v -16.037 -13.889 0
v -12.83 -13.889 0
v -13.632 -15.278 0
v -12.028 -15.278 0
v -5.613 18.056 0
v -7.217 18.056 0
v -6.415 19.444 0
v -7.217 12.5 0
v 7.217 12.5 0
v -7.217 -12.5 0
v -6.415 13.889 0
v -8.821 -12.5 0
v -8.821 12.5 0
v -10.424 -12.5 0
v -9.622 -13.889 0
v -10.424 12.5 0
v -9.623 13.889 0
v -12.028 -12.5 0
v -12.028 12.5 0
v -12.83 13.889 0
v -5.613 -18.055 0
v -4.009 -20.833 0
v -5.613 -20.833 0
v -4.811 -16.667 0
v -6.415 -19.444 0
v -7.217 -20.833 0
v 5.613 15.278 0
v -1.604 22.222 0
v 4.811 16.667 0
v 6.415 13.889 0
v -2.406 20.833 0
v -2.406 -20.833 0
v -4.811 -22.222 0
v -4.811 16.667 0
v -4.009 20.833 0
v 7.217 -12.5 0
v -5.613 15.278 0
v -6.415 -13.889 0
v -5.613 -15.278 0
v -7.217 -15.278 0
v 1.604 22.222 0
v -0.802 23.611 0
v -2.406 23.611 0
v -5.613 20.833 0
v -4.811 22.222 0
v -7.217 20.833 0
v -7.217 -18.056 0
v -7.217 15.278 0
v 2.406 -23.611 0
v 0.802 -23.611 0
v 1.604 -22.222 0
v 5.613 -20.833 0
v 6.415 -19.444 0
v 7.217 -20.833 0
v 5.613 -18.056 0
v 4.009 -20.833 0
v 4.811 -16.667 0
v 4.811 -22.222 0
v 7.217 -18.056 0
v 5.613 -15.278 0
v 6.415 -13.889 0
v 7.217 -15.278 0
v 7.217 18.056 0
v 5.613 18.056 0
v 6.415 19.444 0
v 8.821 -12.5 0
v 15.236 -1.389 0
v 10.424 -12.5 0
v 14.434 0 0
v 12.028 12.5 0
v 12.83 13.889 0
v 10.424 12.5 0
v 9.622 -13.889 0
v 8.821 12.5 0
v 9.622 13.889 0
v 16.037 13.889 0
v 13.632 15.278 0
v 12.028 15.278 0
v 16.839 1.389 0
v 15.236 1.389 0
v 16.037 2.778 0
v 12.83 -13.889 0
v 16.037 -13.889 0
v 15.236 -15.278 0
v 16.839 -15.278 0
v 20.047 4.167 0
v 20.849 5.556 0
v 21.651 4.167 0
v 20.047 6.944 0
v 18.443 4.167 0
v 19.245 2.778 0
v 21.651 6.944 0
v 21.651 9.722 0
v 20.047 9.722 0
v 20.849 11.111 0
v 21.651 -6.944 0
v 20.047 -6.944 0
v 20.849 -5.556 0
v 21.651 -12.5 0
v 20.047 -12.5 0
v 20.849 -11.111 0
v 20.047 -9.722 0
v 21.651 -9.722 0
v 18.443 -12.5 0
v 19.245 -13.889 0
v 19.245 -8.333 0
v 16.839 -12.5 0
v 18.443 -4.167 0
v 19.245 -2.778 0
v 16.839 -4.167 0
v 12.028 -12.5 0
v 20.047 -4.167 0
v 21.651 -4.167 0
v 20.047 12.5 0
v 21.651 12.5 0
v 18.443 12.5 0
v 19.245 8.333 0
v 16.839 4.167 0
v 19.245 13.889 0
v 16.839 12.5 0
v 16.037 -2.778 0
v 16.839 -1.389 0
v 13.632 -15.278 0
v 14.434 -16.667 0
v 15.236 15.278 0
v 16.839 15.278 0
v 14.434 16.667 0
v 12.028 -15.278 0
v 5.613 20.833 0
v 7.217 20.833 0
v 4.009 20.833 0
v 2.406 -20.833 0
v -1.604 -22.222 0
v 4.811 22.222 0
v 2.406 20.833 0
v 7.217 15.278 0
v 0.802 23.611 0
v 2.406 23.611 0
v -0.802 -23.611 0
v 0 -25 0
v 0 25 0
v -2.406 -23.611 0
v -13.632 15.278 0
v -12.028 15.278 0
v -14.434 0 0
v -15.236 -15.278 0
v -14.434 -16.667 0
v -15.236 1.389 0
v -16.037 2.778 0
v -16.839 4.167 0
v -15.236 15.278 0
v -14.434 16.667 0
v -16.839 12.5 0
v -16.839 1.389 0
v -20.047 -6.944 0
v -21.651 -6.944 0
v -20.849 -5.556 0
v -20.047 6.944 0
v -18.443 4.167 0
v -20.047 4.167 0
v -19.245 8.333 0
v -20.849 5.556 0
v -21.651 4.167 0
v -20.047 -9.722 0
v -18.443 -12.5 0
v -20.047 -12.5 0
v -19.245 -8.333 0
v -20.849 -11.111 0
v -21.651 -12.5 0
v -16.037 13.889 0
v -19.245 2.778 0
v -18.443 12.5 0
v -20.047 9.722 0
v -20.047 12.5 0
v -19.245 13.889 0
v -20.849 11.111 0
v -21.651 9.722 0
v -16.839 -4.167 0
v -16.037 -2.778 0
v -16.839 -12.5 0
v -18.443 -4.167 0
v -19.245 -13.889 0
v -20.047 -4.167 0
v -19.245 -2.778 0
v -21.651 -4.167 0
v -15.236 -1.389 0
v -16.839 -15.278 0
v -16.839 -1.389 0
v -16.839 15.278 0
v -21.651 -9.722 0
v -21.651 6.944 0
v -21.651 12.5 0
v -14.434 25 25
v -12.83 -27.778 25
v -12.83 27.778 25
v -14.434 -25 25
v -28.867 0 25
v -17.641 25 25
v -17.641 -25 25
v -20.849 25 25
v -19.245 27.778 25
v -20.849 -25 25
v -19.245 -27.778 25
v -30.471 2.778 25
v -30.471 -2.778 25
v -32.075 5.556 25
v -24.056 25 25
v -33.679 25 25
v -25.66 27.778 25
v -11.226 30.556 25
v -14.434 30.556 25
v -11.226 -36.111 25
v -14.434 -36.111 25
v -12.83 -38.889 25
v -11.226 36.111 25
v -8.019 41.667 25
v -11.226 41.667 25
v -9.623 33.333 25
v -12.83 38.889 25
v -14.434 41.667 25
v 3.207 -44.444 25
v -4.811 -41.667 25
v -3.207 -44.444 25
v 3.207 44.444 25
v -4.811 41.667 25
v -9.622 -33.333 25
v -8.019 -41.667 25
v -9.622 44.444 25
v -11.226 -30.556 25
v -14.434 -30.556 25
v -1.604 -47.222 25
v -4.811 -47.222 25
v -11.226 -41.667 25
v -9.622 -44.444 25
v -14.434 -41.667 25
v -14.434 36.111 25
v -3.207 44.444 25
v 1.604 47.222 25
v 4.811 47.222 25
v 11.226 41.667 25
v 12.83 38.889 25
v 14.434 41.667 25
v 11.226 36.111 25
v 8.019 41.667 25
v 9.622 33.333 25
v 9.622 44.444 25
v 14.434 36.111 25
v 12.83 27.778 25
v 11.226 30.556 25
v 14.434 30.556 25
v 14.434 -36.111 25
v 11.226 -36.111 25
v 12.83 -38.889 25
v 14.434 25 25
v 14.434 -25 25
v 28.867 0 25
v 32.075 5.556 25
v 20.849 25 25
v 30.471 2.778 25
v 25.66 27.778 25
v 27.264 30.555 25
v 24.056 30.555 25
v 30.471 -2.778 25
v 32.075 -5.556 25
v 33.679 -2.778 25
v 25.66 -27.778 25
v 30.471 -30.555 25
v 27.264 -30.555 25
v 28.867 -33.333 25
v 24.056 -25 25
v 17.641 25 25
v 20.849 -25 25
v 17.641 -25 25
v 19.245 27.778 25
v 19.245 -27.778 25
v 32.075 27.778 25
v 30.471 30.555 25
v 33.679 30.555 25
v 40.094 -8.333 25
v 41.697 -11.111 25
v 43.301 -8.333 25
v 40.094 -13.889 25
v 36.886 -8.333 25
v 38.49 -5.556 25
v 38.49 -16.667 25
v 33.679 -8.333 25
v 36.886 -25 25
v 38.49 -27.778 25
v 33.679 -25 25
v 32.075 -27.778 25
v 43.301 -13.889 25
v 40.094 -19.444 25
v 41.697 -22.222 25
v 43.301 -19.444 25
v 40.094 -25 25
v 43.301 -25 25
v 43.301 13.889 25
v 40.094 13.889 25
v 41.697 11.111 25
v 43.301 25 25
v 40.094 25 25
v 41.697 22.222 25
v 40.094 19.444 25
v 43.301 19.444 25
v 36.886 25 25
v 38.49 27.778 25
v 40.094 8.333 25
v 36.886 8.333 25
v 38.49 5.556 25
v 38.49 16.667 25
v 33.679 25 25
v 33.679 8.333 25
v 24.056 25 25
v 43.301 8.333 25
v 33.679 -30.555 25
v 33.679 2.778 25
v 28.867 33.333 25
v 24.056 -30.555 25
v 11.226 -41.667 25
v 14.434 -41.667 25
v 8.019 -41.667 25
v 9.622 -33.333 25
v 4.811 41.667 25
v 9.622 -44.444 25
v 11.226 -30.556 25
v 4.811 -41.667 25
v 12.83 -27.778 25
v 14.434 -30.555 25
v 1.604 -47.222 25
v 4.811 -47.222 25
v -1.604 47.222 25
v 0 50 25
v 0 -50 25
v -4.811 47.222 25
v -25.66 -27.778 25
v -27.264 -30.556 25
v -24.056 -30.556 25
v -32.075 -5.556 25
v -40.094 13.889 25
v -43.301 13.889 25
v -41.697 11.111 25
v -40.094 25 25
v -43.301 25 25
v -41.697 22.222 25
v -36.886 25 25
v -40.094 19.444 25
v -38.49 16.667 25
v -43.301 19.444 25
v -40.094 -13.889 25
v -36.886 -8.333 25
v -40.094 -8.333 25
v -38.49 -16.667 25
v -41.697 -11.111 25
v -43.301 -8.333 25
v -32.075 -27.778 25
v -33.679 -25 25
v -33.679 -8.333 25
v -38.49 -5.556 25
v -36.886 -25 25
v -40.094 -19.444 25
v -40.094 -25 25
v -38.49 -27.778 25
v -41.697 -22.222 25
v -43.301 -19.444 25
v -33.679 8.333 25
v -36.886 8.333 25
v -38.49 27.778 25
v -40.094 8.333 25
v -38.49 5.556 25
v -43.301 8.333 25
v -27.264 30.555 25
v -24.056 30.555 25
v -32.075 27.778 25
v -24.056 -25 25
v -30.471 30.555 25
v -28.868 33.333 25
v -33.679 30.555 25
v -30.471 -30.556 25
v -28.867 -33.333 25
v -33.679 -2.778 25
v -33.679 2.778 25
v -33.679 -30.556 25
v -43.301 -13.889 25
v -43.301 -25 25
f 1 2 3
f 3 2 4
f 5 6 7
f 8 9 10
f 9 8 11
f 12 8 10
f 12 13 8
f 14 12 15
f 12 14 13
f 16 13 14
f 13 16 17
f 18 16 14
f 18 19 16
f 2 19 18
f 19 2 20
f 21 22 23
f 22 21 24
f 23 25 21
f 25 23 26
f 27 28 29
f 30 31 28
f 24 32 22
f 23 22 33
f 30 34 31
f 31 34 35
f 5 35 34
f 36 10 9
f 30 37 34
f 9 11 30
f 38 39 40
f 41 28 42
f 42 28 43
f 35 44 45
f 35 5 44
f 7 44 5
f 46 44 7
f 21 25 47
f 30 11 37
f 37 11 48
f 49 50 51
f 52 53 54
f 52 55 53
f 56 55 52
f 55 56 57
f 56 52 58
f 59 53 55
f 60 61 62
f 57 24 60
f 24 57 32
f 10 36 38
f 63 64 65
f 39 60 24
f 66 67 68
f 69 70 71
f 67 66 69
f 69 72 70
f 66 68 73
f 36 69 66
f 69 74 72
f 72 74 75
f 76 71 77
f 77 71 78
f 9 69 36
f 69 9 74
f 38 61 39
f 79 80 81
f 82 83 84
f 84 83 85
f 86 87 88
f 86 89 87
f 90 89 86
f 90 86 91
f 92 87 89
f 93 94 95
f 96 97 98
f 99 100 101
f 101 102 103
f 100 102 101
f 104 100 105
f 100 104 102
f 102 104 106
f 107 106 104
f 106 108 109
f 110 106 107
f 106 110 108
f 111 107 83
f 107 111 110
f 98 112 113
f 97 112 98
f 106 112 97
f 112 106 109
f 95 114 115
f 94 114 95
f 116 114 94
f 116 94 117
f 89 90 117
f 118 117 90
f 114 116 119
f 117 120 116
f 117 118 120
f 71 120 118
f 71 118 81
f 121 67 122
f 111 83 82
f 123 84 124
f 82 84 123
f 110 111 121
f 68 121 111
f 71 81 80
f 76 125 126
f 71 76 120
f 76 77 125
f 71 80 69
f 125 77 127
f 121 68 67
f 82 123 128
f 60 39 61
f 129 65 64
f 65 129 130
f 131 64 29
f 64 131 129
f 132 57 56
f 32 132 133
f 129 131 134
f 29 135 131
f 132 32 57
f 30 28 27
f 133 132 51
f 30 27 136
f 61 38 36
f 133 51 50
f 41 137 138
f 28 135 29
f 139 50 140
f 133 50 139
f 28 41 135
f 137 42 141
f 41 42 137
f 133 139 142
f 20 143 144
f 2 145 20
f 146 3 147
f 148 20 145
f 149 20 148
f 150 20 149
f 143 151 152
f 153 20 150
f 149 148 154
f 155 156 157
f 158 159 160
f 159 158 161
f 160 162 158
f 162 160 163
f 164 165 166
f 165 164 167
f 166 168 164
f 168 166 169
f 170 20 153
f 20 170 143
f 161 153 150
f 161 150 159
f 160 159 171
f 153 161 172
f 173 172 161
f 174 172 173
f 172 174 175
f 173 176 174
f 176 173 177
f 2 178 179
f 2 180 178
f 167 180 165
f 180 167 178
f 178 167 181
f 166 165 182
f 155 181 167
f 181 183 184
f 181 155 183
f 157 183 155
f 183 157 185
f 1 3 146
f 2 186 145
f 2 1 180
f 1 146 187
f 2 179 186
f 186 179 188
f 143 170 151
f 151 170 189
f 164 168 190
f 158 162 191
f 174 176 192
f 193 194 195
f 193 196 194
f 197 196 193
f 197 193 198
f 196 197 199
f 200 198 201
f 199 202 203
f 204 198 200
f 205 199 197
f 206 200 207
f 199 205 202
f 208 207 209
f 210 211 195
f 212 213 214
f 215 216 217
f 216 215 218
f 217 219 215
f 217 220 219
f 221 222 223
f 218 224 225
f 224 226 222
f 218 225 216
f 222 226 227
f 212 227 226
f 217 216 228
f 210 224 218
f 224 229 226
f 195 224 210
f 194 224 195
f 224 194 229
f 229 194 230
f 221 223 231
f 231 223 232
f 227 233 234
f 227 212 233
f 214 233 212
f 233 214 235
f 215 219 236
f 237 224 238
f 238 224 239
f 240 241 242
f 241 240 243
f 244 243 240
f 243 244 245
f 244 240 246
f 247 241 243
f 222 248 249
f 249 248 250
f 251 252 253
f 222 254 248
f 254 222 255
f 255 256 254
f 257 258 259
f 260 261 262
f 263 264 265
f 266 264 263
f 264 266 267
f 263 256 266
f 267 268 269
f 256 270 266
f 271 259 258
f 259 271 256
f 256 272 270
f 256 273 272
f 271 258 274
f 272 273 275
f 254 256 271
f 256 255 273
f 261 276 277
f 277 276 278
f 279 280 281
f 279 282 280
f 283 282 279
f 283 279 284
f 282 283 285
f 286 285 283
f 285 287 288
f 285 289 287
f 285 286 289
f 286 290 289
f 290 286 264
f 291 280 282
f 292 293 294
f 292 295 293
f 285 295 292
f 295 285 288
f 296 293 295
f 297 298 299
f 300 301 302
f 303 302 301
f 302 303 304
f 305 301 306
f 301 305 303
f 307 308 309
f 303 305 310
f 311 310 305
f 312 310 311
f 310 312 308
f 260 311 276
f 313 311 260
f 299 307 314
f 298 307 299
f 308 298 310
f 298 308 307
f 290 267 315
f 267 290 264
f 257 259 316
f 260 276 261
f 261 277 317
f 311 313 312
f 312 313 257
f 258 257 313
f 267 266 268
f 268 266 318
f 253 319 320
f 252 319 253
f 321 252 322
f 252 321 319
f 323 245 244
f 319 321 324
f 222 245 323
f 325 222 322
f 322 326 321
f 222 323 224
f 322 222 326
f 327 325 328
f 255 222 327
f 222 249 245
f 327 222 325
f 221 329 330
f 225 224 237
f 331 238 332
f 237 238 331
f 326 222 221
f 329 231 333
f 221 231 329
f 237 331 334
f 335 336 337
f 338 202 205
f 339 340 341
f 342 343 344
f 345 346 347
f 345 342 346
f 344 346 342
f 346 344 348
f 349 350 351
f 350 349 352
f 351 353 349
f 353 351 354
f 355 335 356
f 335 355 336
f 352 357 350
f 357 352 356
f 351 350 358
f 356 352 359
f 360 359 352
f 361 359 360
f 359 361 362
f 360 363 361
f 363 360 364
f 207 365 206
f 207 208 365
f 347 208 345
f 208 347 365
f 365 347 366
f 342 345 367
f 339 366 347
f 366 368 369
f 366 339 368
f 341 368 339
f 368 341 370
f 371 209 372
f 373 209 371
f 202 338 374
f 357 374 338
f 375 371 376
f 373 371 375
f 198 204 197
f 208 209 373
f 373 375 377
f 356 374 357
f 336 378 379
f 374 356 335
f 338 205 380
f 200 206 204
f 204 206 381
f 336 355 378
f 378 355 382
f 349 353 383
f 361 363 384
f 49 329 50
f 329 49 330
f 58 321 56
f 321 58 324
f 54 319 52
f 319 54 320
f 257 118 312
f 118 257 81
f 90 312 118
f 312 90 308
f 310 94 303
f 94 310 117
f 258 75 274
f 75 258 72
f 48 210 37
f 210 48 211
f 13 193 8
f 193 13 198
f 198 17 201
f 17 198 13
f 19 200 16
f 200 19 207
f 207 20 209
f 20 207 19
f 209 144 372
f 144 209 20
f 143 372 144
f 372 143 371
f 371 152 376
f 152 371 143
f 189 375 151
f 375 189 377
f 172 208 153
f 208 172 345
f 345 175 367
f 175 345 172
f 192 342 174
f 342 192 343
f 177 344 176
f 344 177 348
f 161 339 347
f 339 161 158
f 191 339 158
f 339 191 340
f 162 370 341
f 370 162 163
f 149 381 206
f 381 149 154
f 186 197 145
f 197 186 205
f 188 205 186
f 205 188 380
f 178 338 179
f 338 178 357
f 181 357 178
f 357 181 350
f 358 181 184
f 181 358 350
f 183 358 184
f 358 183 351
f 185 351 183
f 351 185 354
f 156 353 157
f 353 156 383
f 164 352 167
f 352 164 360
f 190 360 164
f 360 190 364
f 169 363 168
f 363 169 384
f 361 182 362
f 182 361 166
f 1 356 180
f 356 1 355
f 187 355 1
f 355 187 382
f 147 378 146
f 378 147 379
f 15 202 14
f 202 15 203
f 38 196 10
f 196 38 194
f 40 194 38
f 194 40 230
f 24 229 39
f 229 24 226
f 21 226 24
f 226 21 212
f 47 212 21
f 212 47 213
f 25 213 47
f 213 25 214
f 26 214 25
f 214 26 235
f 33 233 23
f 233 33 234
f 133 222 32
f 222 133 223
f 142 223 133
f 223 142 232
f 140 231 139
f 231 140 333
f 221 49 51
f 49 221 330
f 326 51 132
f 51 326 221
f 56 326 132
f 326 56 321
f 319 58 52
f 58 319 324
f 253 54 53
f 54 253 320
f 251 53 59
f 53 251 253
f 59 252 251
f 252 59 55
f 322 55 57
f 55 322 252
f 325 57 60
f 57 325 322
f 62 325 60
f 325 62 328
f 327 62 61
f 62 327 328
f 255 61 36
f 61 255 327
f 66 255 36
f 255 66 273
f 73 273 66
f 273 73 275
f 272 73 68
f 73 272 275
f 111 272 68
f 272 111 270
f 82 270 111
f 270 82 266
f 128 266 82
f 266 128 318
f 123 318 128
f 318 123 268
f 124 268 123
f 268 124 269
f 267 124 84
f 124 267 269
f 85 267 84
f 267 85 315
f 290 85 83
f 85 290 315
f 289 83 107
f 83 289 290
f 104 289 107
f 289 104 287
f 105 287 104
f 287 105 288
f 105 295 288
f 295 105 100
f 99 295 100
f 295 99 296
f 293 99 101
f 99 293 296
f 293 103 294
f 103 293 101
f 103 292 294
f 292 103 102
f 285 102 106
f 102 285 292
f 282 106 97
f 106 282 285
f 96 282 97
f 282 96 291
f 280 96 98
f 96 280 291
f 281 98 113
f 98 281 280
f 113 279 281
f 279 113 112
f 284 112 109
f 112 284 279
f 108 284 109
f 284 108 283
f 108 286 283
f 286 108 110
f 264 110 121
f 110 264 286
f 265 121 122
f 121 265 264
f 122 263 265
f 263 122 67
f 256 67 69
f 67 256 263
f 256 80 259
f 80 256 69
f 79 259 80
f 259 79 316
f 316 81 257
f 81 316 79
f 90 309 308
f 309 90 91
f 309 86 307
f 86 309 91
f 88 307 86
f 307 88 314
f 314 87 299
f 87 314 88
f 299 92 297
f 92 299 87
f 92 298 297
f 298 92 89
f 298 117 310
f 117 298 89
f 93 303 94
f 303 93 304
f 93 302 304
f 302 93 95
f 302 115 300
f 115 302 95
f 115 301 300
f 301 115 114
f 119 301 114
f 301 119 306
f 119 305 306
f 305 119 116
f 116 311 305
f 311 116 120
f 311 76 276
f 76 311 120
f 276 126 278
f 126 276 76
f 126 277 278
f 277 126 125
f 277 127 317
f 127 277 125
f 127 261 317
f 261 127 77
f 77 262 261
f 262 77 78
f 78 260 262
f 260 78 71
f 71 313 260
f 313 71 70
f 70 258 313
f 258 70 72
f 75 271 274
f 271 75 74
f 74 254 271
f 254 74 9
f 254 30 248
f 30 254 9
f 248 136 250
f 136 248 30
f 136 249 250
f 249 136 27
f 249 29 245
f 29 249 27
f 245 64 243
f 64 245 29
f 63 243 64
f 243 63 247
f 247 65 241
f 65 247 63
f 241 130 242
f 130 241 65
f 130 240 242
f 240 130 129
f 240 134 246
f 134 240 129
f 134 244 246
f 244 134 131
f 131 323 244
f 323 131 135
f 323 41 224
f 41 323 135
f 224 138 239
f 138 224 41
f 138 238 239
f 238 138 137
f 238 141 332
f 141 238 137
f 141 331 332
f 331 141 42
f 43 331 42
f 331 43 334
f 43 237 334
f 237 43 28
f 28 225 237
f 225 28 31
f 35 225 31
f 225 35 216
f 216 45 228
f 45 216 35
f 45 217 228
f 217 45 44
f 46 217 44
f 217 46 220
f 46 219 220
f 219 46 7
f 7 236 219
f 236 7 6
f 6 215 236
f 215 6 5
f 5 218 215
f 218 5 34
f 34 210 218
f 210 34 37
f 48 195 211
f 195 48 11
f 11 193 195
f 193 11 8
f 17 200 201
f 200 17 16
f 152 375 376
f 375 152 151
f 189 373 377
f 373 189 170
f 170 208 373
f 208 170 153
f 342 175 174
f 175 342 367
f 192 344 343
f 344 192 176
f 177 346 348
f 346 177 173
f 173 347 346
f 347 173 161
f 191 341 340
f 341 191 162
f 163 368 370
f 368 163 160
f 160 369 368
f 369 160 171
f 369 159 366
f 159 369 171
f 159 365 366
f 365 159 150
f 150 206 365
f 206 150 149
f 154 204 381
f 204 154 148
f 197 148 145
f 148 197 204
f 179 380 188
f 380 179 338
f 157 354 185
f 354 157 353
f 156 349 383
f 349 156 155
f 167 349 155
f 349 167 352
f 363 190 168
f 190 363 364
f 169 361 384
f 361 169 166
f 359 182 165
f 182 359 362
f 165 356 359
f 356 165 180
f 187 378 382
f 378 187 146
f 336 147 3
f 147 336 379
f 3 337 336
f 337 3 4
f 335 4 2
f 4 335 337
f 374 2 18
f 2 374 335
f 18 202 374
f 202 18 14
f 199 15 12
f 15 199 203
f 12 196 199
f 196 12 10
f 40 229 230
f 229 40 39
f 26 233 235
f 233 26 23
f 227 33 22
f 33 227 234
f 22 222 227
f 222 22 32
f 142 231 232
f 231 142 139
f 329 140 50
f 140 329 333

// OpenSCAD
union() {
	translate(v = [0, 0, 25]) {
		linear_extrude(height = 125, scale = 0, slices = 100, twist = 180) {
			union() {
				rotate(a = 60) {
					union() {
						rotate(a = 60) {
							union() {
								rotate(a = 60) {
									union() {
										rotate(a = 60) {
											union() {
												rotate(a = 60) {
													union() {
														rotate(a = 60) {
															union() {
																rotate(a = 60) {
																	union() {
																		rotate(a = 60) {
																			union() {
																				rotate(a = 60) {
																					union() {
																						rotate(a = 60) {
																							union() {
																								rotate(a = 60) {
																									union() {
																										rotate(a = 60) {
																											union() {
																												polygon(points = [[0, 50.0], [-43.30127018922193, -25.0], [43.30127018922193, -25.0]]);
																												rotate(a = 60) {
																													polygon(points = [[0, 50.0], [-43.30127018922193, -25.0], [43.30127018922193, -25.0]]);
																												}
																											}
																										}
																										translate(v = [0, 33.333333333333336, 0]) {
																											scale(v = 0.3333333333333333) {
																												union() {
																													polygon(points = [[0, 50.0], [-43.30127018922193, -25.0], [43.30127018922193, -25.0]]);
																													rotate(a = 60) {
																														polygon(points = [[0, 50.0], [-43.30127018922193, -25.0], [43.30127018922193, -25.0]]);
																													}
																												}
																											}
																										}
																									}
																								}
																								translate(v = [0, 33.333333333333336, 0]) {
																									scale(v = 0.3333333333333333) {
																										union() {
																											polygon(points = [[0, 50.0], [-43.30127018922193, -25.0], [43.30127018922193, -25.0]]);
																											rotate(a = 60) {
																												polygon(points = [[0, 50.0], [-43.30127018922193, -25.0], [43.30127018922193, -25.0]]);
																											}
																										}
																									}
																								}
																							}
																						}
																						translate(v = [0, 33.333333333333336, 0]) {
																							scale(v = 0.3333333333333333) {
																								union() {
																									polygon(points = [[0, 50.0], [-43.30127018922193, -25.0], [43.30127018922193, -25.0]]);
																									rotate(a = 60) {
																										polygon(points = [[0, 50.0], [-43.30127018922193, -25.0], [43.30127018922193, -25.0]]);
																									}
																								}
																							}
																						}
																					}
																				}
																				translate(v = [0, 33.333333333333336, 0]) {
																					scale(v = 0.3333333333333333) {
																						union() {
																							polygon(points = [[0, 50.0], [-43.30127018922193, -25.0], [43.30127018922193, -25.0]]);
																							rotate(a = 60) {
																								polygon(points = [[0, 50.0], [-43.30127018922193, -25.0], [43.30127018922193, -25.0]]);
																							}
																						}
																					}
																				}
																			}
																		}
																		translate(v = [0, 33.333333333333336, 0]) {
																			scale(v = 0.3333333333333333) {
																				union() {
																					polygon(points = [[0, 50.0], [-43.30127018922193, -25.0], [43.30127018922193, -25.0]]);
																					rotate(a = 60) {
																						polygon(points = [[0, 50.0], [-43.30127018922193, -25.0], [43.30127018922193, -25.0]]);
																					}
																				}
																			}
																		}
																	}
																}
																translate(v = [0, 33.333333333333336, 0]) {
																	scale(v = 0.3333333333333333) {
																		union() {
																			polygon(points = [[0, 50.0], [-43.30127018922193, -25.0], [43.30127018922193, -25.0]]);
																			rotate(a = 60) {
																				polygon(points = [[0, 50.0], [-43.30127018922193, -25.0], [43.30127018922193, -25.0]]);
																			}
																		}
																	}
																}
															}
														}
														translate(v = [0, 33.333333333333336, 0]) {
															scale(v = 0.3333333333333333) {
																union() {
																	rotate(a = 60) {
																		union() {
																			rotate(a = 60) {
																				union() {
																					rotate(a = 60) {
																						union() {
																							rotate(a = 60) {
																								union() {
																									rotate(a = 60) {
																										union() {
																											rotate(a = 60) {
																												union() {
																													polygon(points = [[0, 50.0], [-43.30127018922193, -25.0], [43.30127018922193, -25.0]]);
																													rotate(a = 60) {
																														polygon(points = [[0, 50.0], [-43.30127018922193, -25.0], [43.30127018922193, -25.0]]);
																													}
																												}
																											}
																											translate(v = [0, 33.333333333333336, 0]) {
																												scale(v = 0.3333333333333333) {
																													union() {
																														polygon(points = [[0, 50.0], [-43.30127018922193, -25.0], [43.30127018922193, -25.0]]);
																														rotate(a = 60) {
																															polygon(points = [[0, 50.0], [-43.30127018922193, -25.0], [43.30127018922193, -25.0]]);
																														}
																													}
																												}
																											}
																										}
																									}
																									translate(v = [0, 33.333333333333336, 0]) {
																										scale(v = 0.3333333333333333) {
																											union() {
																												polygon(points = [[0, 50.0], [-43.30127018922193, -25.0], [43.30127018922193, -25.0]]);
																												rotate(a = 60) {
																													polygon(points = [[0, 50.0], [-43.30127018922193, -25.0], [43.30127018922193, -25.0]]);
																												}
																											}
																										}
																									}
																								}
																							}
																							translate(v = [0, 33.333333333333336, 0]) {
																								scale(v = 0.3333333333333333) {
																									union() {
																										polygon(points = [[0, 50.0], [-43.30127018922193, -25.0], [43.30127018922193, -25.0]]);
																										rotate(a = 60) {
																											polygon(points = [[0, 50.0], [-43.30127018922193, -25.0], [43.30127018922193, -25.0]]);
																										}
																									}
																								}
																							}
																						}
																					}
																					translate(v = [0, 33.333333333333336, 0]) {
																						scale(v = 0.3333333333333333) {
																							union() {
																								polygon(points = [[0, 50.0], [-43.30127018922193, -25.0], [43.30127018922193, -25.0]]);
																								rotate(a = 60) {
																									polygon(points = [[0, 50.0], [-43.30127018922193, -25.0], [43.30127018922193, -25.0]]);
																								}
																							}
																						}
																					}
																				}
																			}
																			translate(v = [0, 33.333333333333336, 0]) {
																				scale(v = 0.3333333333333333) {
																					union() {
																						polygon(points = [[0, 50.0], [-43.30127018922193, -25.0], [43.30127018922193, -25.0]]);
																						rotate(a = 60) {
																							polygon(points = [[0, 50.0], [-43.30127018922193, -25.0], [43.30127018922193, -25.0]]);
																						}
																					}
																				}
																			}
																		}
																	}
																	translate(v = [0, 33.333333333333336, 0]) {
																		scale(v = 0.3333333333333333) {
																			union() {
																				polygon(points = [[0, 50.0], [-43.30127018922193, -25.0], [43.30127018922193, -25.0]]);
																				rotate(a = 60) {
																					polygon(points = [[0, 50.0], [-43.30127018922193, -25.0], [43.30127018922193, -25.0]]);
																				}
																			}
																		}
																	}
																}
															}
														}
													}
												}
												translate(v = [0, 33.333333333333336, 0]) {
													scale(v = 0.3333333333333333) {
														union() {
															rotate(a = 60) {
																union() {
																	rotate(a = 60) {
																		union() {
																			rotate(a = 60) {
																				union() {
																					rotate(a = 60) {
																						union() {
																							rotate(a = 60) {
																								union() {
																									rotate(a = 60) {
																										union() {
																											polygon(points = [[0, 50.0], [-43.30127018922193, -25.0], [43.30127018922193, -25.0]]);
																											rotate(a = 60) {
																												polygon(points = [[0, 50.0], [-43.30127018922193, -25.0], [43.30127018922193, -25.0]]);
																											}
																										}
																									}
																									translate(v = [0, 33.333333333333336, 0]) {
																										scale(v = 0.3333333333333333) {
																											union() {
																												polygon(points = [[0, 50.0], [-43.30127018922193, -25.0], [43.30127018922193, -25.0]]);
																												rotate(a = 60) {
																													polygon(points = [[0, 50.0], [-43.30127018922193, -25.0], [43.30127018922193, -25.0]]);
																												}
																											}
																										}
																									}
																								}
																							}
																							translate(v = [0, 33.333333333333336, 0]) {
																								scale(v = 0.3333333333333333) {
																									union() {
																										polygon(points = [[0, 50.0], [-43.30127018922193, -25.0], [43.30127018922193, -25.0]]);
																										rotate(a = 60) {
																											polygon(points = [[0, 50.0], [-43.30127018922193, -25.0], [43.30127018922193, -25.0]]);
																										}
																									}
																								}
																							}
																						}
																					}
																					translate(v = [0, 33.333333333333336, 0]) {
																						scale(v = 0.3333333333333333) {
																							union() {
																								polygon(points = [[0, 50.0], [-43.30127018922193, -25.0], [43.30127018922193, -25.0]]);
																								rotate(a = 60) {
																									polygon(points = [[0, 50.0], [-43.30127018922193, -25.0], [43.30127018922193, -25.0]]);
																								}
																							}
																						}
																					}
																				}
																			}
																			translate(v = [0, 33.333333333333336, 0]) {
																				scale(v = 0.3333333333333333) {
																					union() {
																						polygon(points = [[0, 50.0], [-43.30127018922193, -25.0], [43.30127018922193, -25.0]]);
																						rotate(a = 60) {
																							polygon(points = [[0, 50.0], [-43.30127018922193, -25.0], [43.30127018922193, -25.0]]);
																						}
																					}
																				}
																			}
																		}
																	}
																	translate(v = [0, 33.333333333333336, 0]) {
																		scale(v = 0.3333333333333333) {
																			union() {
																				polygon(points = [[0, 50.0], [-43.30127018922193, -25.0], [43.30127018922193, -25.0]]);
																				rotate(a = 60) {
																					polygon(points = [[0, 50.0], [-43.30127018922193, -25.0], [43.30127018922193, -25.0]]);
																				}
																			}
																		}
																	}
																}
															}
															translate(v = [0, 33.333333333333336, 0]) {
																scale(v = 0.3333333333333333) {
																	union() {
																		polygon(points = [[0, 50.0], [-43.30127018922193, -25.0], [43.30127018922193, -25.0]]);
																		rotate(a = 60) {
																			polygon(points = [[0, 50.0], [-43.30127018922193, -25.0], [43.30127018922193, -25.0]]);
																		}
																	}
																}
															}
														}
													}
												}
											}
										}
										translate(v = [0, 33.333333333333336, 0]) {
											scale(v = 0.3333333333333333) {
												union() {
													rotate(a = 60) {
														union() {
															rotate(a = 60) {
																union() {
																	rotate(a = 60) {
																		union() {
																			rotate(a = 60) {
																				union() {
																					rotate(a = 60) {
																						union() {
																							rotate(a = 60) {
																								union() {
																									polygon(points = [[0, 50.0], [-43.30127018922193, -25.0], [43.30127018922193, -25.0]]);
																									rotate(a = 60) {
																										polygon(points = [[0, 50.0], [-43.30127018922193, -25.0], [43.30127018922193, -25.0]]);
																									}
																								}
																							}
																							translate(v = [0, 33.333333333333336, 0]) {
																								scale(v = 0.3333333333333333) {
																									union() {
																										polygon(points = [[0, 50.0], [-43.30127018922193, -25.0], [43.30127018922193, -25.0]]);
																										rotate(a = 60) {
																											polygon(points = [[0, 50.0], [-43.30127018922193, -25.0], [43.30127018922193, -25.0]]);
																										}
																									}
																								}
																							}
																						}
																					}
																					translate(v = [0, 33.333333333333336, 0]) {
																						scale(v = 0.3333333333333333) {
																							union() {
																								polygon(points = [[0, 50.0], [-43.30127018922193, -25.0], [43.30127018922193, -25.0]]);
																								rotate(a = 60) {
																									polygon(points = [[0, 50.0], [-43.30127018922193, -25.0], [43.30127018922193, -25.0]]);
																								}
																							}
																						}
																					}
																				}
																			}
																			translate(v = [0, 33.333333333333336, 0]) {
																				scale(v = 0.3333333333333333) {
																					union() {
																						polygon(points = [[0, 50.0], [-43.30127018922193, -25.0], [43.30127018922193, -25.0]]);
																						rotate(a = 60) {
																							polygon(points = [[0, 50.0], [-43.30127018922193, -25.0], [43.30127018922193, -25.0]]);
																						}
																					}
																				}
																			}
																		}
																	}
																	translate(v = [0, 33.333333333333336, 0]) {
																		scale(v = 0.3333333333333333) {
																			union() {
																				polygon(points = [[0, 50.0], [-43.30127018922193, -25.0], [43.30127018922193, -25.0]]);
																				rotate(a = 60) {
																					polygon(points = [[0, 50.0], [-43.30127018922193, -25.0], [43.30127018922193, -25.0]]);
																				}
																			}
																		}
																	}
																}
															}
															translate(v = [0, 33.333333333333336, 0]) {
																scale(v = 0.3333333333333333) {
																	union() {
																		polygon(points = [[0, 50.0], [-43.30127018922193, -25.0], [43.30127018922193, -25.0]]);
																		rotate(a = 60) {
																			polygon(points = [[0, 50.0], [-43.30127018922193, -25.0], [43.30127018922193, -25.0]]);
																		}
																	}
																}
															}
														}
													}
													translate(v = [0, 33.333333333333336, 0]) {
														scale(v = 0.3333333333333333) {
															union() {
																polygon(points = [[0, 50.0], [-43.30127018922193, -25.0], [43.30127018922193, -25.0]]);
																rotate(a = 60) {
																	polygon(points = [[0, 50.0], [-43.30127018922193, -25.0], [43.30127018922193, -25.0]]);
																}
															}
														}
													}
												}
											}
										}
									}
								}
								translate(v = [0, 33.333333333333336, 0]) {
									scale(v = 0.3333333333333333) {
										union() {
											rotate(a = 60) {
												union() {
													rotate(a = 60) {
														union() {
															rotate(a = 60) {
																union() {
																	rotate(a = 60) {
																		union() {
																			rotate(a = 60) {
																				union() {
																					rotate(a = 60) {
																						union() {
																							polygon(points = [[0, 50.0], [-43.30127018922193, -25.0], [43.30127018922193, -25.0]]);
																							rotate(a = 60) {
																								polygon(points = [[0, 50.0], [-43.30127018922193, -25.0], [43.30127018922193, -25.0]]);
																							}
																						}
																					}
																					translate(v = [0, 33.333333333333336, 0]) {
																						scale(v = 0.3333333333333333) {
																							union() {
																								polygon(points = [[0, 50.0], [-43.30127018922193, -25.0], [43.30127018922193, -25.0]]);
																								rotate(a = 60) {
																									polygon(points = [[0, 50.0], [-43.30127018922193, -25.0], [43.30127018922193, -25.0]]);
																								}
																							}
																						}
																					}
																				}
																			}
																			translate(v = [0, 33.333333333333336, 0]) {
																				scale(v = 0.3333333333333333) {
																					union() {
																						polygon(points = [[0, 50.0], [-43.30127018922193, -25.0], [43.30127018922193, -25.0]]);
																						rotate(a = 60) {
																							polygon(points = [[0, 50.0], [-43.30127018922193, -25.0], [43.30127018922193, -25.0]]);
																						}
																					}
																				}
																			}
																		}
																	}
																	translate(v = [0, 33.333333333333336, 0]) {
																		scale(v = 0.3333333333333333) {
																			union() {
																				polygon(points = [[0, 50.0], [-43.30127018922193, -25.0], [43.30127018922193, -25.0]]);
																				rotate(a = 60) {
																					polygon(points = [[0, 50.0], [-43.30127018922193, -25.0], [43.30127018922193, -25.0]]);
																				}
																			}
																		}
																	}
																}
															}
															translate(v = [0, 33.333333333333336, 0]) {
																scale(v = 0.3333333333333333) {
																	union() {
																		polygon(points = [[0, 50.0], [-43.30127018922193, -25.0], [43.30127018922193, -25.0]]);
																		rotate(a = 60) {
																			polygon(points = [[0, 50.0], [-43.30127018922193, -25.0], [43.30127018922193, -25.0]]);
																		}
																	}
																}
															}
														}
													}
													translate(v = [0, 33.333333333333336, 0]) {
														scale(v = 0.3333333333333333) {
															union() {
																polygon(points = [[0, 50.0], [-43.30127018922193, -25.0], [43.30127018922193, -25.0]]);
																rotate(a = 60) {
																	polygon(points = [[0, 50.0], [-43.30127018922193, -25.0], [43.30127018922193, -25.0]]);
																}
															}
														}
													}
												}
											}
											translate(v = [0, 33.333333333333336, 0]) {
												scale(v = 0.3333333333333333) {
													union() {
														polygon(points = [[0, 50.0], [-43.30127018922193, -25.0], [43.30127018922193, -25.0]]);
														rotate(a = 60) {
															polygon(points = [[0, 50.0], [-43.30127018922193, -25.0], [43.30127018922193, -25.0]]);
														}
													}
												}
											}
										}
									}
								}
							}
						}
						translate(v = [0, 33.333333333333336, 0]) {
							scale(v = 0.3333333333333333) {
								union() {
									rotate(a = 60) {
										union() {
											rotate(a = 60) {
												union() {
													rotate(a = 60) {
														union() {
															rotate(a = 60) {
																union() {
																	rotate(a = 60) {
																		union() {
																			rotate(a = 60) {
																				union() {
																					polygon(points = [[0, 50.0], [-43.30127018922193, -25.0], [43.30127018922193, -25.0]]);
																					rotate(a = 60) {
																						polygon(points = [[0, 50.0], [-43.30127018922193, -25.0], [43.30127018922193, -25.0]]);
																					}
																				}
																			}
																			translate(v = [0, 33.333333333333336, 0]) {
																				scale(v = 0.3333333333333333) {
																					union() {
																						polygon(points = [[0, 50.0], [-43.30127018922193, -25.0], [43.30127018922193, -25.0]]);
																						rotate(a = 60) {
																							polygon(points = [[0, 50.0], [-43.30127018922193, -25.0], [43.30127018922193, -25.0]]);
																						}
																					}
																				}
																			}
																		}
																	}
																	translate(v = [0, 33.333333333333336, 0]) {
																		scale(v = 0.3333333333333333) {
																			union() {
																				polygon(points = [[0, 50.0], [-43.30127018922193, -25.0], [43.30127018922193, -25.0]]);
																				rotate(a = 60) {
																					polygon(points = [[0, 50.0], [-43.30127018922193, -25.0], [43.30127018922193, -25.0]]);
																				}
																			}
																		}
																	}
																}
															}
															translate(v = [0, 33.333333333333336, 0]) {
																scale(v = 0.3333333333333333) {
																	union() {
																		polygon(points = [[0, 50.0], [-43.30127018922193, -25.0], [43.30127018922193, -25.0]]);
																		rotate(a = 60) {
																			polygon(points = [[0, 50.0], [-43.30127018922193, -25.0], [43.30127018922193, -25.0]]);
																		}
																	}
																}
															}
														}
													}
													translate(v = [0, 33.333333333333336, 0]) {
														scale(v = 0.3333333333333333) {
															union() {
																polygon(points = [[0, 50.0], [-43.30127018922193, -25.0], [43.30127018922193, -25.0]]);
																rotate(a = 60) {
																	polygon(points = [[0, 50.0], [-43.30127018922193, -25.0], [43.30127018922193, -25.0]]);
																}
															}
														}
													}
												}
											}
											translate(v = [0, 33.333333333333336, 0]) {
												scale(v = 0.3333333333333333) {
													union() {
														polygon(points = [[0, 50.0], [-43.30127018922193, -25.0], [43.30127018922193, -25.0]]);
														rotate(a = 60) {
															polygon(points = [[0, 50.0], [-43.30127018922193, -25.0], [43.30127018922193, -25.0]]);
														}
													}
												}
											}
										}
									}
									translate(v = [0, 33.333333333333336, 0]) {
										scale(v = 0.3333333333333333) {
											union() {
												polygon(points = [[0, 50.0], [-43.30127018922193, -25.0], [43.30127018922193, -25.0]]);
												rotate(a = 60) {
													polygon(points = [[0, 50.0], [-43.30127018922193, -25.0], [43.30127018922193, -25.0]]);
												}
											}
										}
									}
								}
							}
						}
					}
				}
				translate(v = [0, 33.333333333333336, 0]) {
					scale(v = 0.3333333333333333) {
						union() {
							rotate(a = 60) {
								union() {
									rotate(a = 60) {
										union() {
											rotate(a = 60) {
												union() {
													rotate(a = 60) {
														union() {
															rotate(a = 60) {
																union() {
																	rotate(a = 60) {
																		union() {
																			polygon(points = [[0, 50.0], [-43.30127018922193, -25.0], [43.30127018922193, -25.0]]);
																			rotate(a = 60) {
																				polygon(points = [[0, 50.0], [-43.30127018922193, -25.0], [43.30127018922193, -25.0]]);
																			}
																		}
																	}
																	translate(v = [0, 33.333333333333336, 0]) {
																		scale(v = 0.3333333333333333) {
																			union() {
																				polygon(points = [[0, 50.0], [-43.30127018922193, -25.0], [43.30127018922193, -25.0]]);
																				rotate(a = 60) {
																					polygon(points = [[0, 50.0], [-43.30127018922193, -25.0], [43.30127018922193, -25.0]]);
																				}
																			}
																		}
																	}
																}
															}
															translate(v = [0, 33.333333333333336, 0]) {
																scale(v = 0.3333333333333333) {
																	union() {
																		polygon(points = [[0, 50.0], [-43.30127018922193, -25.0], [43.30127018922193, -25.0]]);
																		rotate(a = 60) {
																			polygon(points = [[0, 50.0], [-43.30127018922193, -25.0], [43.30127018922193, -25.0]]);
																		}
																	}
																}
															}
														}
													}
													translate(v = [0, 33.333333333333336, 0]) {
														scale(v = 0.3333333333333333) {
															union() {
																polygon(points = [[0, 50.0], [-43.30127018922193, -25.0], [43.30127018922193, -25.0]]);
																rotate(a = 60) {
																	polygon(points = [[0, 50.0], [-43.30127018922193, -25.0], [43.30127018922193, -25.0]]);
																}
															}
														}
													}
												}
											}
											translate(v = [0, 33.333333333333336, 0]) {
												scale(v = 0.3333333333333333) {
													union() {
														polygon(points = [[0, 50.0], [-43.30127018922193, -25.0], [43.30127018922193, -25.0]]);
														rotate(a = 60) {
															polygon(points = [[0, 50.0], [-43.30127018922193, -25.0], [43.30127018922193, -25.0]]);
														}
													}
												}
											}
										}
									}
									translate(v = [0, 33.333333333333336, 0]) {
										scale(v = 0.3333333333333333) {
											union() {
												polygon(points = [[0, 50.0], [-43.30127018922193, -25.0], [43.30127018922193, -25.0]]);
												rotate(a = 60) {
													polygon(points = [[0, 50.0], [-43.30127018922193, -25.0], [43.30127018922193, -25.0]]);
												}
											}
										}
									}
								}
							}
							translate(v = [0, 33.333333333333336, 0]) {
								scale(v = 0.3333333333333333) {
									union() {
										polygon(points = [[0, 50.0], [-43.30127018922193, -25.0], [43.30127018922193, -25.0]]);
										rotate(a = 60) {
											polygon(points = [[0, 50.0], [-43.30127018922193, -25.0], [43.30127018922193, -25.0]]);
										}
									}
								}
							}
						}
					}
				}
			}
		}
	}
	linear_extrude(height = 25, scale = 2.0, slices = 2, twist = 0) {
		union() {
			rotate(a = 60) {
				union() {
					rotate(a = 60) {
						union() {
							rotate(a = 60) {
								union() {
									rotate(a = 60) {
										union() {
											rotate(a = 60) {
												union() {
													rotate(a = 60) {
														union() {
															rotate(a = 60) {
																union() {
																	rotate(a = 60) {
																		union() {
																			rotate(a = 60) {
																				union() {
																					rotate(a = 60) {
																						union() {
																							rotate(a = 60) {
																								union() {
																									rotate(a = 60) {
																										union() {
																											polygon(points = [[0, 25.0], [-21.650635094610966, -12.5], [21.650635094610966, -12.5]]);
																											rotate(a = 60) {
																												polygon(points = [[0, 25.0], [-21.650635094610966, -12.5], [21.650635094610966, -12.5]]);
																											}
																										}
																									}
																									translate(v = [0, 16.666666666666668, 0]) {
																										scale(v = 0.3333333333333333) {
																											union() {
																												polygon(points = [[0, 25.0], [-21.650635094610966, -12.5], [21.650635094610966, -12.5]]);
																												rotate(a = 60) {
																													polygon(points = [[0, 25.0], [-21.650635094610966, -12.5], [21.650635094610966, -12.5]]);
																												}
																											}
																										}
																									}
																								}
																							}
																							translate(v = [0, 16.666666666666668, 0]) {
																								scale(v = 0.3333333333333333) {
																									union() {
																										polygon(points = [[0, 25.0], [-21.650635094610966, -12.5], [21.650635094610966, -12.5]]);
																										rotate(a = 60) {
																											polygon(points = [[0, 25.0], [-21.650635094610966, -12.5], [21.650635094610966, -12.5]]);
																										}
																									}
																								}
																							}
																						}
																					}
																					translate(v = [0, 16.666666666666668, 0]) {
																						scale(v = 0.3333333333333333) {
																							union() {
																								polygon(points = [[0, 25.0], [-21.650635094610966, -12.5], [21.650635094610966, -12.5]]);
																								rotate(a = 60) {
																									polygon(points = [[0, 25.0], [-21.650635094610966, -12.5], [21.650635094610966, -12.5]]);
																								}
																							}
																						}
																					}
																				}
																			}
																			translate(v = [0, 16.666666666666668, 0]) {
																				scale(v = 0.3333333333333333) {
																					union() {
																						polygon(points = [[0, 25.0], [-21.650635094610966, -12.5], [21.650635094610966, -12.5]]);
																						rotate(a = 60) {
																							polygon(points = [[0, 25.0], [-21.650635094610966, -12.5], [21.650635094610966, -12.5]]);
																						}
																					}
																				}
																			}
																		}
																	}
																	translate(v = [0, 16.666666666666668, 0]) {
																		scale(v = 0.3333333333333333) {
																			union() {
																				polygon(points = [[0, 25.0], [-21.650635094610966, -12.5], [21.650635094610966, -12.5]]);
																				rotate(a = 60) {
																					polygon(points = [[0, 25.0], [-21.650635094610966, -12.5], [21.650635094610966, -12.5]]);
																				}
																			}
																		}
																	}
																}
															}
															translate(v = [0, 16.666666666666668, 0]) {
																scale(v = 0.3333333333333333) {
																	union() {
																		polygon(points = [[0, 25.0], [-21.650635094610966, -12.5], [21.650635094610966, -12.5]]);
																		rotate(a = 60) {
																			polygon(points = [[0, 25.0], [-21.650635094610966, -12.5], [21.650635094610966, -12.5]]);
																		}
																	}
																}
															}
														}
													}
													translate(v = [0, 16.666666666666668, 0]) {
														scale(v = 0.3333333333333333) {
															union() {
																rotate(a = 60) {
																	union() {
																		rotate(a = 60) {
																			union() {
																				rotate(a = 60) {
																					union() {
																						rotate(a = 60) {
																							union() {
																								rotate(a = 60) {
																									union() {
																										rotate(a = 60) {
																											union() {
																												polygon(points = [[0, 25.0], [-21.650635094610966, -12.5], [21.650635094610966, -12.5]]);
																												rotate(a = 60) {
																													polygon(points = [[0, 25.0], [-21.650635094610966, -12.5], [21.650635094610966, -12.5]]);
																												}
																											}
																										}
																										translate(v = [0, 16.666666666666668, 0]) {
																											scale(v = 0.3333333333333333) {
																												union() {
																													polygon(points = [[0, 25.0], [-21.650635094610966, -12.5], [21.650635094610966, -12.5]]);
																													rotate(a = 60) {
																														polygon(points = [[0, 25.0], [-21.650635094610966, -12.5], [21.650635094610966, -12.5]]);
																													}
																												}
																											}
																										}
																									}
																								}
																								translate(v = [0, 16.666666666666668, 0]) {
																									scale(v = 0.3333333333333333) {
																										union() {
																											polygon(points = [[0, 25.0], [-21.650635094610966, -12.5], [21.650635094610966, -12.5]]);
																											rotate(a = 60) {
																												polygon(points = [[0, 25.0], [-21.650635094610966, -12.5], [21.650635094610966, -12.5]]);
																											}
																										}
																									}
																								}
																							}
																						}
																						translate(v = [0, 16.666666666666668, 0]) {
																							scale(v = 0.3333333333333333) {
																								union() {
																									polygon(points = [[0, 25.0], [-21.650635094610966, -12.5], [21.650635094610966, -12.5]]);
																									rotate(a = 60) {
																										polygon(points = [[0, 25.0], [-21.650635094610966, -12.5], [21.650635094610966, -12.5]]);
																									}
																								}
																							}
																						}
																					}
																				}
																				translate(v = [0, 16.666666666666668, 0]) {
																					scale(v = 0.3333333333333333) {
																						union() {
																							polygon(points = [[0, 25.0], [-21.650635094610966, -12.5], [21.650635094610966, -12.5]]);
																							rotate(a = 60) {
																								polygon(points = [[0, 25.0], [-21.650635094610966, -12.5], [21.650635094610966, -12.5]]);
																							}
																						}
																					}
																				}
																			}
																		}
																		translate(v = [0, 16.666666666666668, 0]) {
																			scale(v = 0.3333333333333333) {
																				union() {
																					polygon(points = [[0, 25.0], [-21.650635094610966, -12.5], [21.650635094610966, -12.5]]);
																					rotate(a = 60) {
																						polygon(points = [[0, 25.0], [-21.650635094610966, -12.5], [21.650635094610966, -12.5]]);
																					}
																				}
																			}
																		}
																	}
																}
																translate(v = [0, 16.666666666666668, 0]) {
																	scale(v = 0.3333333333333333) {
																		union() {
																			polygon(points = [[0, 25.0], [-21.650635094610966, -12.5], [21.650635094610966, -12.5]]);
																			rotate(a = 60) {
																				polygon(points = [[0, 25.0], [-21.650635094610966, -12.5], [21.650635094610966, -12.5]]);
																			}
																		}
																	}
																}
															}
														}
													}
												}
											}
											translate(v = [0, 16.666666666666668, 0]) {
												scale(v = 0.3333333333333333) {
													union() {
														rotate(a = 60) {
															union() {
																rotate(a = 60) {
																	union() {
																		rotate(a = 60) {
																			union() {
																				rotate(a = 60) {
																					union() {
																						rotate(a = 60) {
																							union() {
																								rotate(a = 60) {
																									union() {
																										polygon(points = [[0, 25.0], [-21.650635094610966, -12.5], [21.650635094610966, -12.5]]);
																										rotate(a = 60) {
																											polygon(points = [[0, 25.0], [-21.650635094610966, -12.5], [21.650635094610966, -12.5]]);
																										}
																									}
																								}
																								translate(v = [0, 16.666666666666668, 0]) {
																									scale(v = 0.3333333333333333) {
																										union() {
																											polygon(points = [[0, 25.0], [-21.650635094610966, -12.5], [21.650635094610966, -12.5]]);
																											rotate(a = 60) {
																												polygon(points = [[0, 25.0], [-21.650635094610966, -12.5], [21.650635094610966, -12.5]]);
																											}
																										}
																									}
																								}
																							}
																						}
																						translate(v = [0, 16.666666666666668, 0]) {
																							scale(v = 0.3333333333333333) {
																								union() {
																									polygon(points = [[0, 25.0], [-21.650635094610966, -12.5], [21.650635094610966, -12.5]]);
																									rotate(a = 60) {
																										polygon(points = [[0, 25.0], [-21.650635094610966, -12.5], [21.650635094610966, -12.5]]);
																									}
																								}
																							}
																						}
																					}
																				}
																				translate(v = [0, 16.666666666666668, 0]) {
																					scale(v = 0.3333333333333333) {
																						union() {
																							polygon(points = [[0, 25.0], [-21.650635094610966, -12.5], [21.650635094610966, -12.5]]);
																							rotate(a = 60) {
																								polygon(points = [[0, 25.0], [-21.650635094610966, -12.5], [21.650635094610966, -12.5]]);
																							}
																						}
																					}
																				}
																			}
																		}
																		translate(v = [0, 16.666666666666668, 0]) {
																			scale(v = 0.3333333333333333) {
																				union() {
																					polygon(points = [[0, 25.0], [-21.650635094610966, -12.5], [21.650635094610966, -12.5]]);
																					rotate(a = 60) {
																						polygon(points = [[0, 25.0], [-21.650635094610966, -12.5], [21.650635094610966, -12.5]]);
																					}
																				}
																			}
																		}
																	}
																}
																translate(v = [0, 16.666666666666668, 0]) {
																	scale(v = 0.3333333333333333) {
																		union() {
																			polygon(points = [[0, 25.0], [-21.650635094610966, -12.5], [21.650635094610966, -12.5]]);
																			rotate(a = 60) {
																				polygon(points = [[0, 25.0], [-21.650635094610966, -12.5], [21.650635094610966, -12.5]]);
																			}
																		}
																	}
																}
															}
														}
														translate(v = [0, 16.666666666666668, 0]) {
															scale(v = 0.3333333333333333) {
																union() {
																	polygon(points = [[0, 25.0], [-21.650635094610966, -12.5], [21.650635094610966, -12.5]]);
																	rotate(a = 60) {
																		polygon(points = [[0, 25.0], [-21.650635094610966, -12.5], [21.650635094610966, -12.5]]);
																	}
																}
															}
														}
													}
												}
											}
										}
									}
									translate(v = [0, 16.666666666666668, 0]) {
										scale(v = 0.3333333333333333) {
											union() {
												rotate(a = 60) {
													union() {
														rotate(a = 60) {
															union() {
																rotate(a = 60) {
																	union() {
																		rotate(a = 60) {
																			union() {
																				rotate(a = 60) {
																					union() {
																						rotate(a = 60) {
																							union() {
																								polygon(points = [[0, 25.0], [-21.650635094610966, -12.5], [21.650635094610966, -12.5]]);
																								rotate(a = 60) {
																									polygon(points = [[0, 25.0], [-21.650635094610966, -12.5], [21.650635094610966, -12.5]]);
																								}
																							}
																						}
																						translate(v = [0, 16.666666666666668, 0]) {
																							scale(v = 0.3333333333333333) {
																								union() {
																									polygon(points = [[0, 25.0], [-21.650635094610966, -12.5], [21.650635094610966, -12.5]]);
																									rotate(a = 60) {
																										polygon(points = [[0, 25.0], [-21.650635094610966, -12.5], [21.650635094610966, -12.5]]);
																									}
																								}
																							}
																						}
																					}
																				}
																				translate(v = [0, 16.666666666666668, 0]) {
																					scale(v = 0.3333333333333333) {
																						union() {
																							polygon(points = [[0, 25.0], [-21.650635094610966, -12.5], [21.650635094610966, -12.5]]);
																							rotate(a = 60) {
																								polygon(points = [[0, 25.0], [-21.650635094610966, -12.5], [21.650635094610966, -12.5]]);
																							}
																						}
																					}
																				}
																			}
																		}
																		translate(v = [0, 16.666666666666668, 0]) {
																			scale(v = 0.3333333333333333) {
																				union() {
																					polygon(points = [[0, 25.0], [-21.650635094610966, -12.5], [21.650635094610966, -12.5]]);
																					rotate(a = 60) {
																						polygon(points = [[0, 25.0], [-21.650635094610966, -12.5], [21.650635094610966, -12.5]]);
																					}
																				}
																			}
																		}
																	}
																}
																translate(v = [0, 16.666666666666668, 0]) {
																	scale(v = 0.3333333333333333) {
																		union() {
																			polygon(points = [[0, 25.0], [-21.650635094610966, -12.5], [21.650635094610966, -12.5]]);
																			rotate(a = 60) {
																				polygon(points = [[0, 25.0], [-21.650635094610966, -12.5], [21.650635094610966, -12.5]]);
																			}
																		}
																	}
																}
															}
														}
														translate(v = [0, 16.666666666666668, 0]) {
															scale(v = 0.3333333333333333) {
																union() {
																	polygon(points = [[0, 25.0], [-21.650635094610966, -12.5], [21.650635094610966, -12.5]]);
																	rotate(a = 60) {
																		polygon(points = [[0, 25.0], [-21.650635094610966, -12.5], [21.650635094610966, -12.5]]);
																	}
																}
															}
														}
													}
												}
												translate(v = [0, 16.666666666666668, 0]) {
													scale(v = 0.3333333333333333) {
														union() {
															polygon(points = [[0, 25.0], [-21.650635094610966, -12.5], [21.650635094610966, -12.5]]);
															rotate(a = 60) {
																polygon(points = [[0, 25.0], [-21.650635094610966, -12.5], [21.650635094610966, -12.5]]);
															}
														}
													}
												}
											}
										}
									}
								}
							}
							translate(v = [0, 16.666666666666668, 0]) {
								scale(v = 0.3333333333333333) {
									union() {
										rotate(a = 60) {
											union() {
												rotate(a = 60) {
													union() {
														rotate(a = 60) {
															union() {
																rotate(a = 60) {
																	union() {
																		rotate(a = 60) {
																			union() {
																				rotate(a = 60) {
																					union() {
																						polygon(points = [[0, 25.0], [-21.650635094610966, -12.5], [21.650635094610966, -12.5]]);
																						rotate(a = 60) {
																							polygon(points = [[0, 25.0], [-21.650635094610966, -12.5], [21.650635094610966, -12.5]]);
																						}
																					}
																				}
																				translate(v = [0, 16.666666666666668, 0]) {
																					scale(v = 0.3333333333333333) {
																						union() {
																							polygon(points = [[0, 25.0], [-21.650635094610966, -12.5], [21.650635094610966, -12.5]]);
																							rotate(a = 60) {
																								polygon(points = [[0, 25.0], [-21.650635094610966, -12.5], [21.650635094610966, -12.5]]);
																							}
																						}
																					}
																				}
																			}
																		}
																		translate(v = [0, 16.666666666666668, 0]) {
																			scale(v = 0.3333333333333333) {
																				union() {
																					polygon(points = [[0, 25.0], [-21.650635094610966, -12.5], [21.650635094610966, -12.5]]);
																					rotate(a = 60) {
																						polygon(points = [[0, 25.0], [-21.650635094610966, -12.5], [21.650635094610966, -12.5]]);
																					}
																				}
																			}
																		}
																	}
																}
																translate(v = [0, 16.666666666666668, 0]) {
																	scale(v = 0.3333333333333333) {
																		union() {
																			polygon(points = [[0, 25.0], [-21.650635094610966, -12.5], [21.650635094610966, -12.5]]);
																			rotate(a = 60) {
																				polygon(points = [[0, 25.0], [-21.650635094610966, -12.5], [21.650635094610966, -12.5]]);
																			}
																		}
																	}
																}
															}
														}
														translate(v = [0, 16.666666666666668, 0]) {
															scale(v = 0.3333333333333333) {
																union() {
																	polygon(points = [[0, 25.0], [-21.650635094610966, -12.5], [21.650635094610966, -12.5]]);
																	rotate(a = 60) {
																		polygon(points = [[0, 25.0], [-21.650635094610966, -12.5], [21.650635094610966, -12.5]]);
																	}
																}
															}
														}
													}
												}
												translate(v = [0, 16.666666666666668, 0]) {
													scale(v = 0.3333333333333333) {
														union() {
															polygon(points = [[0, 25.0], [-21.650635094610966, -12.5], [21.650635094610966, -12.5]]);
															rotate(a = 60) {
																polygon(points = [[0, 25.0], [-21.650635094610966, -12.5], [21.650635094610966, -12.5]]);
															}
														}
													}
												}
											}
										}
										translate(v = [0, 16.666666666666668, 0]) {
											scale(v = 0.3333333333333333) {
												union() {
													polygon(points = [[0, 25.0], [-21.650635094610966, -12.5], [21.650635094610966, -12.5]]);
													rotate(a = 60) {
														polygon(points = [[0, 25.0], [-21.650635094610966, -12.5], [21.650635094610966, -12.5]]);
													}
												}
											}
										}
									}
								}
							}
						}
					}
					translate(v = [0, 16.666666666666668, 0]) {
						scale(v = 0.3333333333333333) {
							union() {
								rotate(a = 60) {
									union() {
										rotate(a = 60) {
											union() {
												rotate(a = 60) {
													union() {
														rotate(a = 60) {
															union() {
																rotate(a = 60) {
																	union() {
																		rotate(a = 60) {
																			union() {
																				polygon(points = [[0, 25.0], [-21.650635094610966, -12.5], [21.650635094610966, -12.5]]);
																				rotate(a = 60) {
																					polygon(points = [[0, 25.0], [-21.650635094610966, -12.5], [21.650635094610966, -12.5]]);
																				}
																			}
																		}
																		translate(v = [0, 16.666666666666668, 0]) {
																			scale(v = 0.3333333333333333) {
																				union() {
																					polygon(points = [[0, 25.0], [-21.650635094610966, -12.5], [21.650635094610966, -12.5]]);
																					rotate(a = 60) {
																						polygon(points = [[0, 25.0], [-21.650635094610966, -12.5], [21.650635094610966, -12.5]]);
																					}
																				}
																			}
																		}
																	}
																}
																translate(v = [0, 16.666666666666668, 0]) {
																	scale(v = 0.3333333333333333) {
																		union() {
																			polygon(points = [[0, 25.0], [-21.650635094610966, -12.5], [21.650635094610966, -12.5]]);
																			rotate(a = 60) {
																				polygon(points = [[0, 25.0], [-21.650635094610966, -12.5], [21.650635094610966, -12.5]]);
																			}
																		}
																	}
																}
															}
														}
														translate(v = [0, 16.666666666666668, 0]) {
															scale(v = 0.3333333333333333) {
																union() {
																	polygon(points = [[0, 25.0], [-21.650635094610966, -12.5], [21.650635094610966, -12.5]]);
																	rotate(a = 60) {
																		polygon(points = [[0, 25.0], [-21.650635094610966, -12.5], [21.650635094610966, -12.5]]);
																	}
																}
															}
														}
													}
												}
												translate(v = [0, 16.666666666666668, 0]) {
													scale(v = 0.3333333333333333) {
														union() {
															polygon(points = [[0, 25.0], [-21.650635094610966, -12.5], [21.650635094610966, -12.5]]);
															rotate(a = 60) {
																polygon(points = [[0, 25.0], [-21.650635094610966, -12.5], [21.650635094610966, -12.5]]);
															}
														}
													}
												}
											}
										}
										translate(v = [0, 16.666666666666668, 0]) {
											scale(v = 0.3333333333333333) {
												union() {
													polygon(points = [[0, 25.0], [-21.650635094610966, -12.5], [21.650635094610966, -12.5]]);
													rotate(a = 60) {
														polygon(points = [[0, 25.0], [-21.650635094610966, -12.5], [21.650635094610966, -12.5]]);
													}
												}
											}
										}
									}
								}
								translate(v = [0, 16.666666666666668, 0]) {
									scale(v = 0.3333333333333333) {
										union() {
											polygon(points = [[0, 25.0], [-21.650635094610966, -12.5], [21.650635094610966, -12.5]]);
											rotate(a = 60) {
												polygon(points = [[0, 25.0], [-21.650635094610966, -12.5], [21.650635094610966, -12.5]]);
											}
										}
									}
								}
							}
						}
					}
				}
			}
			translate(v = [0, 16.666666666666668, 0]) {
				scale(v = 0.3333333333333333) {
					union() {
						rotate(a = 60) {
							union() {
								rotate(a = 60) {
									union() {
										rotate(a = 60) {
											union() {
												rotate(a = 60) {
													union() {
														rotate(a = 60) {
															union() {
																rotate(a = 60) {
																	union() {
																		polygon(points = [[0, 25.0], [-21.650635094610966, -12.5], [21.650635094610966, -12.5]]);
																		rotate(a = 60) {
																			polygon(points = [[0, 25.0], [-21.650635094610966, -12.5], [21.650635094610966, -12.5]]);
																		}
																	}
																}
																translate(v = [0, 16.666666666666668, 0]) {
																	scale(v = 0.3333333333333333) {
																		union() {
																			polygon(points = [[0, 25.0], [-21.650635094610966, -12.5], [21.650635094610966, -12.5]]);
																			rotate(a = 60) {
																				polygon(points = [[0, 25.0], [-21.650635094610966, -12.5], [21.650635094610966, -12.5]]);
																			}
																		}
																	}
																}
															}
														}
														translate(v = [0, 16.666666666666668, 0]) {
															scale(v = 0.3333333333333333) {
																union() {
																	polygon(points = [[0, 25.0], [-21.650635094610966, -12.5], [21.650635094610966, -12.5]]);
																	rotate(a = 60) {
																		polygon(points = [[0, 25.0], [-21.650635094610966, -12.5], [21.650635094610966, -12.5]]);
																	}
																}
															}
														}
													}
												}
												translate(v = [0, 16.666666666666668, 0]) {
													scale(v = 0.3333333333333333) {
														union() {
															polygon(points = [[0, 25.0], [-21.650635094610966, -12.5], [21.650635094610966, -12.5]]);
															rotate(a = 60) {
																polygon(points = [[0, 25.0], [-21.650635094610966, -12.5], [21.650635094610966, -12.5]]);
															}
														}
													}
												}
											}
										}
										translate(v = [0, 16.666666666666668, 0]) {
											scale(v = 0.3333333333333333) {
												union() {
													polygon(points = [[0, 25.0], [-21.650635094610966, -12.5], [21.650635094610966, -12.5]]);
													rotate(a = 60) {
														polygon(points = [[0, 25.0], [-21.650635094610966, -12.5], [21.650635094610966, -12.5]]);
													}
												}
											}
										}
									}
								}
								translate(v = [0, 16.666666666666668, 0]) {
									scale(v = 0.3333333333333333) {
										union() {
											polygon(points = [[0, 25.0], [-21.650635094610966, -12.5], [21.650635094610966, -12.5]]);
											rotate(a = 60) {
												polygon(points = [[0, 25.0], [-21.650635094610966, -12.5], [21.650635094610966, -12.5]]);
											}
										}
									}
								}
							}
						}
						translate(v = [0, 16.666666666666668, 0]) {
							scale(v = 0.3333333333333333) {
								union() {
									polygon(points = [[0, 25.0], [-21.650635094610966, -12.5], [21.650635094610966, -12.5]]);
									rotate(a = 60) {
										polygon(points = [[0, 25.0], [-21.650635094610966, -12.5], [21.650635094610966, -12.5]]);
									}
								}
							}
						}
					}
				}
			}
		}
	}
}
